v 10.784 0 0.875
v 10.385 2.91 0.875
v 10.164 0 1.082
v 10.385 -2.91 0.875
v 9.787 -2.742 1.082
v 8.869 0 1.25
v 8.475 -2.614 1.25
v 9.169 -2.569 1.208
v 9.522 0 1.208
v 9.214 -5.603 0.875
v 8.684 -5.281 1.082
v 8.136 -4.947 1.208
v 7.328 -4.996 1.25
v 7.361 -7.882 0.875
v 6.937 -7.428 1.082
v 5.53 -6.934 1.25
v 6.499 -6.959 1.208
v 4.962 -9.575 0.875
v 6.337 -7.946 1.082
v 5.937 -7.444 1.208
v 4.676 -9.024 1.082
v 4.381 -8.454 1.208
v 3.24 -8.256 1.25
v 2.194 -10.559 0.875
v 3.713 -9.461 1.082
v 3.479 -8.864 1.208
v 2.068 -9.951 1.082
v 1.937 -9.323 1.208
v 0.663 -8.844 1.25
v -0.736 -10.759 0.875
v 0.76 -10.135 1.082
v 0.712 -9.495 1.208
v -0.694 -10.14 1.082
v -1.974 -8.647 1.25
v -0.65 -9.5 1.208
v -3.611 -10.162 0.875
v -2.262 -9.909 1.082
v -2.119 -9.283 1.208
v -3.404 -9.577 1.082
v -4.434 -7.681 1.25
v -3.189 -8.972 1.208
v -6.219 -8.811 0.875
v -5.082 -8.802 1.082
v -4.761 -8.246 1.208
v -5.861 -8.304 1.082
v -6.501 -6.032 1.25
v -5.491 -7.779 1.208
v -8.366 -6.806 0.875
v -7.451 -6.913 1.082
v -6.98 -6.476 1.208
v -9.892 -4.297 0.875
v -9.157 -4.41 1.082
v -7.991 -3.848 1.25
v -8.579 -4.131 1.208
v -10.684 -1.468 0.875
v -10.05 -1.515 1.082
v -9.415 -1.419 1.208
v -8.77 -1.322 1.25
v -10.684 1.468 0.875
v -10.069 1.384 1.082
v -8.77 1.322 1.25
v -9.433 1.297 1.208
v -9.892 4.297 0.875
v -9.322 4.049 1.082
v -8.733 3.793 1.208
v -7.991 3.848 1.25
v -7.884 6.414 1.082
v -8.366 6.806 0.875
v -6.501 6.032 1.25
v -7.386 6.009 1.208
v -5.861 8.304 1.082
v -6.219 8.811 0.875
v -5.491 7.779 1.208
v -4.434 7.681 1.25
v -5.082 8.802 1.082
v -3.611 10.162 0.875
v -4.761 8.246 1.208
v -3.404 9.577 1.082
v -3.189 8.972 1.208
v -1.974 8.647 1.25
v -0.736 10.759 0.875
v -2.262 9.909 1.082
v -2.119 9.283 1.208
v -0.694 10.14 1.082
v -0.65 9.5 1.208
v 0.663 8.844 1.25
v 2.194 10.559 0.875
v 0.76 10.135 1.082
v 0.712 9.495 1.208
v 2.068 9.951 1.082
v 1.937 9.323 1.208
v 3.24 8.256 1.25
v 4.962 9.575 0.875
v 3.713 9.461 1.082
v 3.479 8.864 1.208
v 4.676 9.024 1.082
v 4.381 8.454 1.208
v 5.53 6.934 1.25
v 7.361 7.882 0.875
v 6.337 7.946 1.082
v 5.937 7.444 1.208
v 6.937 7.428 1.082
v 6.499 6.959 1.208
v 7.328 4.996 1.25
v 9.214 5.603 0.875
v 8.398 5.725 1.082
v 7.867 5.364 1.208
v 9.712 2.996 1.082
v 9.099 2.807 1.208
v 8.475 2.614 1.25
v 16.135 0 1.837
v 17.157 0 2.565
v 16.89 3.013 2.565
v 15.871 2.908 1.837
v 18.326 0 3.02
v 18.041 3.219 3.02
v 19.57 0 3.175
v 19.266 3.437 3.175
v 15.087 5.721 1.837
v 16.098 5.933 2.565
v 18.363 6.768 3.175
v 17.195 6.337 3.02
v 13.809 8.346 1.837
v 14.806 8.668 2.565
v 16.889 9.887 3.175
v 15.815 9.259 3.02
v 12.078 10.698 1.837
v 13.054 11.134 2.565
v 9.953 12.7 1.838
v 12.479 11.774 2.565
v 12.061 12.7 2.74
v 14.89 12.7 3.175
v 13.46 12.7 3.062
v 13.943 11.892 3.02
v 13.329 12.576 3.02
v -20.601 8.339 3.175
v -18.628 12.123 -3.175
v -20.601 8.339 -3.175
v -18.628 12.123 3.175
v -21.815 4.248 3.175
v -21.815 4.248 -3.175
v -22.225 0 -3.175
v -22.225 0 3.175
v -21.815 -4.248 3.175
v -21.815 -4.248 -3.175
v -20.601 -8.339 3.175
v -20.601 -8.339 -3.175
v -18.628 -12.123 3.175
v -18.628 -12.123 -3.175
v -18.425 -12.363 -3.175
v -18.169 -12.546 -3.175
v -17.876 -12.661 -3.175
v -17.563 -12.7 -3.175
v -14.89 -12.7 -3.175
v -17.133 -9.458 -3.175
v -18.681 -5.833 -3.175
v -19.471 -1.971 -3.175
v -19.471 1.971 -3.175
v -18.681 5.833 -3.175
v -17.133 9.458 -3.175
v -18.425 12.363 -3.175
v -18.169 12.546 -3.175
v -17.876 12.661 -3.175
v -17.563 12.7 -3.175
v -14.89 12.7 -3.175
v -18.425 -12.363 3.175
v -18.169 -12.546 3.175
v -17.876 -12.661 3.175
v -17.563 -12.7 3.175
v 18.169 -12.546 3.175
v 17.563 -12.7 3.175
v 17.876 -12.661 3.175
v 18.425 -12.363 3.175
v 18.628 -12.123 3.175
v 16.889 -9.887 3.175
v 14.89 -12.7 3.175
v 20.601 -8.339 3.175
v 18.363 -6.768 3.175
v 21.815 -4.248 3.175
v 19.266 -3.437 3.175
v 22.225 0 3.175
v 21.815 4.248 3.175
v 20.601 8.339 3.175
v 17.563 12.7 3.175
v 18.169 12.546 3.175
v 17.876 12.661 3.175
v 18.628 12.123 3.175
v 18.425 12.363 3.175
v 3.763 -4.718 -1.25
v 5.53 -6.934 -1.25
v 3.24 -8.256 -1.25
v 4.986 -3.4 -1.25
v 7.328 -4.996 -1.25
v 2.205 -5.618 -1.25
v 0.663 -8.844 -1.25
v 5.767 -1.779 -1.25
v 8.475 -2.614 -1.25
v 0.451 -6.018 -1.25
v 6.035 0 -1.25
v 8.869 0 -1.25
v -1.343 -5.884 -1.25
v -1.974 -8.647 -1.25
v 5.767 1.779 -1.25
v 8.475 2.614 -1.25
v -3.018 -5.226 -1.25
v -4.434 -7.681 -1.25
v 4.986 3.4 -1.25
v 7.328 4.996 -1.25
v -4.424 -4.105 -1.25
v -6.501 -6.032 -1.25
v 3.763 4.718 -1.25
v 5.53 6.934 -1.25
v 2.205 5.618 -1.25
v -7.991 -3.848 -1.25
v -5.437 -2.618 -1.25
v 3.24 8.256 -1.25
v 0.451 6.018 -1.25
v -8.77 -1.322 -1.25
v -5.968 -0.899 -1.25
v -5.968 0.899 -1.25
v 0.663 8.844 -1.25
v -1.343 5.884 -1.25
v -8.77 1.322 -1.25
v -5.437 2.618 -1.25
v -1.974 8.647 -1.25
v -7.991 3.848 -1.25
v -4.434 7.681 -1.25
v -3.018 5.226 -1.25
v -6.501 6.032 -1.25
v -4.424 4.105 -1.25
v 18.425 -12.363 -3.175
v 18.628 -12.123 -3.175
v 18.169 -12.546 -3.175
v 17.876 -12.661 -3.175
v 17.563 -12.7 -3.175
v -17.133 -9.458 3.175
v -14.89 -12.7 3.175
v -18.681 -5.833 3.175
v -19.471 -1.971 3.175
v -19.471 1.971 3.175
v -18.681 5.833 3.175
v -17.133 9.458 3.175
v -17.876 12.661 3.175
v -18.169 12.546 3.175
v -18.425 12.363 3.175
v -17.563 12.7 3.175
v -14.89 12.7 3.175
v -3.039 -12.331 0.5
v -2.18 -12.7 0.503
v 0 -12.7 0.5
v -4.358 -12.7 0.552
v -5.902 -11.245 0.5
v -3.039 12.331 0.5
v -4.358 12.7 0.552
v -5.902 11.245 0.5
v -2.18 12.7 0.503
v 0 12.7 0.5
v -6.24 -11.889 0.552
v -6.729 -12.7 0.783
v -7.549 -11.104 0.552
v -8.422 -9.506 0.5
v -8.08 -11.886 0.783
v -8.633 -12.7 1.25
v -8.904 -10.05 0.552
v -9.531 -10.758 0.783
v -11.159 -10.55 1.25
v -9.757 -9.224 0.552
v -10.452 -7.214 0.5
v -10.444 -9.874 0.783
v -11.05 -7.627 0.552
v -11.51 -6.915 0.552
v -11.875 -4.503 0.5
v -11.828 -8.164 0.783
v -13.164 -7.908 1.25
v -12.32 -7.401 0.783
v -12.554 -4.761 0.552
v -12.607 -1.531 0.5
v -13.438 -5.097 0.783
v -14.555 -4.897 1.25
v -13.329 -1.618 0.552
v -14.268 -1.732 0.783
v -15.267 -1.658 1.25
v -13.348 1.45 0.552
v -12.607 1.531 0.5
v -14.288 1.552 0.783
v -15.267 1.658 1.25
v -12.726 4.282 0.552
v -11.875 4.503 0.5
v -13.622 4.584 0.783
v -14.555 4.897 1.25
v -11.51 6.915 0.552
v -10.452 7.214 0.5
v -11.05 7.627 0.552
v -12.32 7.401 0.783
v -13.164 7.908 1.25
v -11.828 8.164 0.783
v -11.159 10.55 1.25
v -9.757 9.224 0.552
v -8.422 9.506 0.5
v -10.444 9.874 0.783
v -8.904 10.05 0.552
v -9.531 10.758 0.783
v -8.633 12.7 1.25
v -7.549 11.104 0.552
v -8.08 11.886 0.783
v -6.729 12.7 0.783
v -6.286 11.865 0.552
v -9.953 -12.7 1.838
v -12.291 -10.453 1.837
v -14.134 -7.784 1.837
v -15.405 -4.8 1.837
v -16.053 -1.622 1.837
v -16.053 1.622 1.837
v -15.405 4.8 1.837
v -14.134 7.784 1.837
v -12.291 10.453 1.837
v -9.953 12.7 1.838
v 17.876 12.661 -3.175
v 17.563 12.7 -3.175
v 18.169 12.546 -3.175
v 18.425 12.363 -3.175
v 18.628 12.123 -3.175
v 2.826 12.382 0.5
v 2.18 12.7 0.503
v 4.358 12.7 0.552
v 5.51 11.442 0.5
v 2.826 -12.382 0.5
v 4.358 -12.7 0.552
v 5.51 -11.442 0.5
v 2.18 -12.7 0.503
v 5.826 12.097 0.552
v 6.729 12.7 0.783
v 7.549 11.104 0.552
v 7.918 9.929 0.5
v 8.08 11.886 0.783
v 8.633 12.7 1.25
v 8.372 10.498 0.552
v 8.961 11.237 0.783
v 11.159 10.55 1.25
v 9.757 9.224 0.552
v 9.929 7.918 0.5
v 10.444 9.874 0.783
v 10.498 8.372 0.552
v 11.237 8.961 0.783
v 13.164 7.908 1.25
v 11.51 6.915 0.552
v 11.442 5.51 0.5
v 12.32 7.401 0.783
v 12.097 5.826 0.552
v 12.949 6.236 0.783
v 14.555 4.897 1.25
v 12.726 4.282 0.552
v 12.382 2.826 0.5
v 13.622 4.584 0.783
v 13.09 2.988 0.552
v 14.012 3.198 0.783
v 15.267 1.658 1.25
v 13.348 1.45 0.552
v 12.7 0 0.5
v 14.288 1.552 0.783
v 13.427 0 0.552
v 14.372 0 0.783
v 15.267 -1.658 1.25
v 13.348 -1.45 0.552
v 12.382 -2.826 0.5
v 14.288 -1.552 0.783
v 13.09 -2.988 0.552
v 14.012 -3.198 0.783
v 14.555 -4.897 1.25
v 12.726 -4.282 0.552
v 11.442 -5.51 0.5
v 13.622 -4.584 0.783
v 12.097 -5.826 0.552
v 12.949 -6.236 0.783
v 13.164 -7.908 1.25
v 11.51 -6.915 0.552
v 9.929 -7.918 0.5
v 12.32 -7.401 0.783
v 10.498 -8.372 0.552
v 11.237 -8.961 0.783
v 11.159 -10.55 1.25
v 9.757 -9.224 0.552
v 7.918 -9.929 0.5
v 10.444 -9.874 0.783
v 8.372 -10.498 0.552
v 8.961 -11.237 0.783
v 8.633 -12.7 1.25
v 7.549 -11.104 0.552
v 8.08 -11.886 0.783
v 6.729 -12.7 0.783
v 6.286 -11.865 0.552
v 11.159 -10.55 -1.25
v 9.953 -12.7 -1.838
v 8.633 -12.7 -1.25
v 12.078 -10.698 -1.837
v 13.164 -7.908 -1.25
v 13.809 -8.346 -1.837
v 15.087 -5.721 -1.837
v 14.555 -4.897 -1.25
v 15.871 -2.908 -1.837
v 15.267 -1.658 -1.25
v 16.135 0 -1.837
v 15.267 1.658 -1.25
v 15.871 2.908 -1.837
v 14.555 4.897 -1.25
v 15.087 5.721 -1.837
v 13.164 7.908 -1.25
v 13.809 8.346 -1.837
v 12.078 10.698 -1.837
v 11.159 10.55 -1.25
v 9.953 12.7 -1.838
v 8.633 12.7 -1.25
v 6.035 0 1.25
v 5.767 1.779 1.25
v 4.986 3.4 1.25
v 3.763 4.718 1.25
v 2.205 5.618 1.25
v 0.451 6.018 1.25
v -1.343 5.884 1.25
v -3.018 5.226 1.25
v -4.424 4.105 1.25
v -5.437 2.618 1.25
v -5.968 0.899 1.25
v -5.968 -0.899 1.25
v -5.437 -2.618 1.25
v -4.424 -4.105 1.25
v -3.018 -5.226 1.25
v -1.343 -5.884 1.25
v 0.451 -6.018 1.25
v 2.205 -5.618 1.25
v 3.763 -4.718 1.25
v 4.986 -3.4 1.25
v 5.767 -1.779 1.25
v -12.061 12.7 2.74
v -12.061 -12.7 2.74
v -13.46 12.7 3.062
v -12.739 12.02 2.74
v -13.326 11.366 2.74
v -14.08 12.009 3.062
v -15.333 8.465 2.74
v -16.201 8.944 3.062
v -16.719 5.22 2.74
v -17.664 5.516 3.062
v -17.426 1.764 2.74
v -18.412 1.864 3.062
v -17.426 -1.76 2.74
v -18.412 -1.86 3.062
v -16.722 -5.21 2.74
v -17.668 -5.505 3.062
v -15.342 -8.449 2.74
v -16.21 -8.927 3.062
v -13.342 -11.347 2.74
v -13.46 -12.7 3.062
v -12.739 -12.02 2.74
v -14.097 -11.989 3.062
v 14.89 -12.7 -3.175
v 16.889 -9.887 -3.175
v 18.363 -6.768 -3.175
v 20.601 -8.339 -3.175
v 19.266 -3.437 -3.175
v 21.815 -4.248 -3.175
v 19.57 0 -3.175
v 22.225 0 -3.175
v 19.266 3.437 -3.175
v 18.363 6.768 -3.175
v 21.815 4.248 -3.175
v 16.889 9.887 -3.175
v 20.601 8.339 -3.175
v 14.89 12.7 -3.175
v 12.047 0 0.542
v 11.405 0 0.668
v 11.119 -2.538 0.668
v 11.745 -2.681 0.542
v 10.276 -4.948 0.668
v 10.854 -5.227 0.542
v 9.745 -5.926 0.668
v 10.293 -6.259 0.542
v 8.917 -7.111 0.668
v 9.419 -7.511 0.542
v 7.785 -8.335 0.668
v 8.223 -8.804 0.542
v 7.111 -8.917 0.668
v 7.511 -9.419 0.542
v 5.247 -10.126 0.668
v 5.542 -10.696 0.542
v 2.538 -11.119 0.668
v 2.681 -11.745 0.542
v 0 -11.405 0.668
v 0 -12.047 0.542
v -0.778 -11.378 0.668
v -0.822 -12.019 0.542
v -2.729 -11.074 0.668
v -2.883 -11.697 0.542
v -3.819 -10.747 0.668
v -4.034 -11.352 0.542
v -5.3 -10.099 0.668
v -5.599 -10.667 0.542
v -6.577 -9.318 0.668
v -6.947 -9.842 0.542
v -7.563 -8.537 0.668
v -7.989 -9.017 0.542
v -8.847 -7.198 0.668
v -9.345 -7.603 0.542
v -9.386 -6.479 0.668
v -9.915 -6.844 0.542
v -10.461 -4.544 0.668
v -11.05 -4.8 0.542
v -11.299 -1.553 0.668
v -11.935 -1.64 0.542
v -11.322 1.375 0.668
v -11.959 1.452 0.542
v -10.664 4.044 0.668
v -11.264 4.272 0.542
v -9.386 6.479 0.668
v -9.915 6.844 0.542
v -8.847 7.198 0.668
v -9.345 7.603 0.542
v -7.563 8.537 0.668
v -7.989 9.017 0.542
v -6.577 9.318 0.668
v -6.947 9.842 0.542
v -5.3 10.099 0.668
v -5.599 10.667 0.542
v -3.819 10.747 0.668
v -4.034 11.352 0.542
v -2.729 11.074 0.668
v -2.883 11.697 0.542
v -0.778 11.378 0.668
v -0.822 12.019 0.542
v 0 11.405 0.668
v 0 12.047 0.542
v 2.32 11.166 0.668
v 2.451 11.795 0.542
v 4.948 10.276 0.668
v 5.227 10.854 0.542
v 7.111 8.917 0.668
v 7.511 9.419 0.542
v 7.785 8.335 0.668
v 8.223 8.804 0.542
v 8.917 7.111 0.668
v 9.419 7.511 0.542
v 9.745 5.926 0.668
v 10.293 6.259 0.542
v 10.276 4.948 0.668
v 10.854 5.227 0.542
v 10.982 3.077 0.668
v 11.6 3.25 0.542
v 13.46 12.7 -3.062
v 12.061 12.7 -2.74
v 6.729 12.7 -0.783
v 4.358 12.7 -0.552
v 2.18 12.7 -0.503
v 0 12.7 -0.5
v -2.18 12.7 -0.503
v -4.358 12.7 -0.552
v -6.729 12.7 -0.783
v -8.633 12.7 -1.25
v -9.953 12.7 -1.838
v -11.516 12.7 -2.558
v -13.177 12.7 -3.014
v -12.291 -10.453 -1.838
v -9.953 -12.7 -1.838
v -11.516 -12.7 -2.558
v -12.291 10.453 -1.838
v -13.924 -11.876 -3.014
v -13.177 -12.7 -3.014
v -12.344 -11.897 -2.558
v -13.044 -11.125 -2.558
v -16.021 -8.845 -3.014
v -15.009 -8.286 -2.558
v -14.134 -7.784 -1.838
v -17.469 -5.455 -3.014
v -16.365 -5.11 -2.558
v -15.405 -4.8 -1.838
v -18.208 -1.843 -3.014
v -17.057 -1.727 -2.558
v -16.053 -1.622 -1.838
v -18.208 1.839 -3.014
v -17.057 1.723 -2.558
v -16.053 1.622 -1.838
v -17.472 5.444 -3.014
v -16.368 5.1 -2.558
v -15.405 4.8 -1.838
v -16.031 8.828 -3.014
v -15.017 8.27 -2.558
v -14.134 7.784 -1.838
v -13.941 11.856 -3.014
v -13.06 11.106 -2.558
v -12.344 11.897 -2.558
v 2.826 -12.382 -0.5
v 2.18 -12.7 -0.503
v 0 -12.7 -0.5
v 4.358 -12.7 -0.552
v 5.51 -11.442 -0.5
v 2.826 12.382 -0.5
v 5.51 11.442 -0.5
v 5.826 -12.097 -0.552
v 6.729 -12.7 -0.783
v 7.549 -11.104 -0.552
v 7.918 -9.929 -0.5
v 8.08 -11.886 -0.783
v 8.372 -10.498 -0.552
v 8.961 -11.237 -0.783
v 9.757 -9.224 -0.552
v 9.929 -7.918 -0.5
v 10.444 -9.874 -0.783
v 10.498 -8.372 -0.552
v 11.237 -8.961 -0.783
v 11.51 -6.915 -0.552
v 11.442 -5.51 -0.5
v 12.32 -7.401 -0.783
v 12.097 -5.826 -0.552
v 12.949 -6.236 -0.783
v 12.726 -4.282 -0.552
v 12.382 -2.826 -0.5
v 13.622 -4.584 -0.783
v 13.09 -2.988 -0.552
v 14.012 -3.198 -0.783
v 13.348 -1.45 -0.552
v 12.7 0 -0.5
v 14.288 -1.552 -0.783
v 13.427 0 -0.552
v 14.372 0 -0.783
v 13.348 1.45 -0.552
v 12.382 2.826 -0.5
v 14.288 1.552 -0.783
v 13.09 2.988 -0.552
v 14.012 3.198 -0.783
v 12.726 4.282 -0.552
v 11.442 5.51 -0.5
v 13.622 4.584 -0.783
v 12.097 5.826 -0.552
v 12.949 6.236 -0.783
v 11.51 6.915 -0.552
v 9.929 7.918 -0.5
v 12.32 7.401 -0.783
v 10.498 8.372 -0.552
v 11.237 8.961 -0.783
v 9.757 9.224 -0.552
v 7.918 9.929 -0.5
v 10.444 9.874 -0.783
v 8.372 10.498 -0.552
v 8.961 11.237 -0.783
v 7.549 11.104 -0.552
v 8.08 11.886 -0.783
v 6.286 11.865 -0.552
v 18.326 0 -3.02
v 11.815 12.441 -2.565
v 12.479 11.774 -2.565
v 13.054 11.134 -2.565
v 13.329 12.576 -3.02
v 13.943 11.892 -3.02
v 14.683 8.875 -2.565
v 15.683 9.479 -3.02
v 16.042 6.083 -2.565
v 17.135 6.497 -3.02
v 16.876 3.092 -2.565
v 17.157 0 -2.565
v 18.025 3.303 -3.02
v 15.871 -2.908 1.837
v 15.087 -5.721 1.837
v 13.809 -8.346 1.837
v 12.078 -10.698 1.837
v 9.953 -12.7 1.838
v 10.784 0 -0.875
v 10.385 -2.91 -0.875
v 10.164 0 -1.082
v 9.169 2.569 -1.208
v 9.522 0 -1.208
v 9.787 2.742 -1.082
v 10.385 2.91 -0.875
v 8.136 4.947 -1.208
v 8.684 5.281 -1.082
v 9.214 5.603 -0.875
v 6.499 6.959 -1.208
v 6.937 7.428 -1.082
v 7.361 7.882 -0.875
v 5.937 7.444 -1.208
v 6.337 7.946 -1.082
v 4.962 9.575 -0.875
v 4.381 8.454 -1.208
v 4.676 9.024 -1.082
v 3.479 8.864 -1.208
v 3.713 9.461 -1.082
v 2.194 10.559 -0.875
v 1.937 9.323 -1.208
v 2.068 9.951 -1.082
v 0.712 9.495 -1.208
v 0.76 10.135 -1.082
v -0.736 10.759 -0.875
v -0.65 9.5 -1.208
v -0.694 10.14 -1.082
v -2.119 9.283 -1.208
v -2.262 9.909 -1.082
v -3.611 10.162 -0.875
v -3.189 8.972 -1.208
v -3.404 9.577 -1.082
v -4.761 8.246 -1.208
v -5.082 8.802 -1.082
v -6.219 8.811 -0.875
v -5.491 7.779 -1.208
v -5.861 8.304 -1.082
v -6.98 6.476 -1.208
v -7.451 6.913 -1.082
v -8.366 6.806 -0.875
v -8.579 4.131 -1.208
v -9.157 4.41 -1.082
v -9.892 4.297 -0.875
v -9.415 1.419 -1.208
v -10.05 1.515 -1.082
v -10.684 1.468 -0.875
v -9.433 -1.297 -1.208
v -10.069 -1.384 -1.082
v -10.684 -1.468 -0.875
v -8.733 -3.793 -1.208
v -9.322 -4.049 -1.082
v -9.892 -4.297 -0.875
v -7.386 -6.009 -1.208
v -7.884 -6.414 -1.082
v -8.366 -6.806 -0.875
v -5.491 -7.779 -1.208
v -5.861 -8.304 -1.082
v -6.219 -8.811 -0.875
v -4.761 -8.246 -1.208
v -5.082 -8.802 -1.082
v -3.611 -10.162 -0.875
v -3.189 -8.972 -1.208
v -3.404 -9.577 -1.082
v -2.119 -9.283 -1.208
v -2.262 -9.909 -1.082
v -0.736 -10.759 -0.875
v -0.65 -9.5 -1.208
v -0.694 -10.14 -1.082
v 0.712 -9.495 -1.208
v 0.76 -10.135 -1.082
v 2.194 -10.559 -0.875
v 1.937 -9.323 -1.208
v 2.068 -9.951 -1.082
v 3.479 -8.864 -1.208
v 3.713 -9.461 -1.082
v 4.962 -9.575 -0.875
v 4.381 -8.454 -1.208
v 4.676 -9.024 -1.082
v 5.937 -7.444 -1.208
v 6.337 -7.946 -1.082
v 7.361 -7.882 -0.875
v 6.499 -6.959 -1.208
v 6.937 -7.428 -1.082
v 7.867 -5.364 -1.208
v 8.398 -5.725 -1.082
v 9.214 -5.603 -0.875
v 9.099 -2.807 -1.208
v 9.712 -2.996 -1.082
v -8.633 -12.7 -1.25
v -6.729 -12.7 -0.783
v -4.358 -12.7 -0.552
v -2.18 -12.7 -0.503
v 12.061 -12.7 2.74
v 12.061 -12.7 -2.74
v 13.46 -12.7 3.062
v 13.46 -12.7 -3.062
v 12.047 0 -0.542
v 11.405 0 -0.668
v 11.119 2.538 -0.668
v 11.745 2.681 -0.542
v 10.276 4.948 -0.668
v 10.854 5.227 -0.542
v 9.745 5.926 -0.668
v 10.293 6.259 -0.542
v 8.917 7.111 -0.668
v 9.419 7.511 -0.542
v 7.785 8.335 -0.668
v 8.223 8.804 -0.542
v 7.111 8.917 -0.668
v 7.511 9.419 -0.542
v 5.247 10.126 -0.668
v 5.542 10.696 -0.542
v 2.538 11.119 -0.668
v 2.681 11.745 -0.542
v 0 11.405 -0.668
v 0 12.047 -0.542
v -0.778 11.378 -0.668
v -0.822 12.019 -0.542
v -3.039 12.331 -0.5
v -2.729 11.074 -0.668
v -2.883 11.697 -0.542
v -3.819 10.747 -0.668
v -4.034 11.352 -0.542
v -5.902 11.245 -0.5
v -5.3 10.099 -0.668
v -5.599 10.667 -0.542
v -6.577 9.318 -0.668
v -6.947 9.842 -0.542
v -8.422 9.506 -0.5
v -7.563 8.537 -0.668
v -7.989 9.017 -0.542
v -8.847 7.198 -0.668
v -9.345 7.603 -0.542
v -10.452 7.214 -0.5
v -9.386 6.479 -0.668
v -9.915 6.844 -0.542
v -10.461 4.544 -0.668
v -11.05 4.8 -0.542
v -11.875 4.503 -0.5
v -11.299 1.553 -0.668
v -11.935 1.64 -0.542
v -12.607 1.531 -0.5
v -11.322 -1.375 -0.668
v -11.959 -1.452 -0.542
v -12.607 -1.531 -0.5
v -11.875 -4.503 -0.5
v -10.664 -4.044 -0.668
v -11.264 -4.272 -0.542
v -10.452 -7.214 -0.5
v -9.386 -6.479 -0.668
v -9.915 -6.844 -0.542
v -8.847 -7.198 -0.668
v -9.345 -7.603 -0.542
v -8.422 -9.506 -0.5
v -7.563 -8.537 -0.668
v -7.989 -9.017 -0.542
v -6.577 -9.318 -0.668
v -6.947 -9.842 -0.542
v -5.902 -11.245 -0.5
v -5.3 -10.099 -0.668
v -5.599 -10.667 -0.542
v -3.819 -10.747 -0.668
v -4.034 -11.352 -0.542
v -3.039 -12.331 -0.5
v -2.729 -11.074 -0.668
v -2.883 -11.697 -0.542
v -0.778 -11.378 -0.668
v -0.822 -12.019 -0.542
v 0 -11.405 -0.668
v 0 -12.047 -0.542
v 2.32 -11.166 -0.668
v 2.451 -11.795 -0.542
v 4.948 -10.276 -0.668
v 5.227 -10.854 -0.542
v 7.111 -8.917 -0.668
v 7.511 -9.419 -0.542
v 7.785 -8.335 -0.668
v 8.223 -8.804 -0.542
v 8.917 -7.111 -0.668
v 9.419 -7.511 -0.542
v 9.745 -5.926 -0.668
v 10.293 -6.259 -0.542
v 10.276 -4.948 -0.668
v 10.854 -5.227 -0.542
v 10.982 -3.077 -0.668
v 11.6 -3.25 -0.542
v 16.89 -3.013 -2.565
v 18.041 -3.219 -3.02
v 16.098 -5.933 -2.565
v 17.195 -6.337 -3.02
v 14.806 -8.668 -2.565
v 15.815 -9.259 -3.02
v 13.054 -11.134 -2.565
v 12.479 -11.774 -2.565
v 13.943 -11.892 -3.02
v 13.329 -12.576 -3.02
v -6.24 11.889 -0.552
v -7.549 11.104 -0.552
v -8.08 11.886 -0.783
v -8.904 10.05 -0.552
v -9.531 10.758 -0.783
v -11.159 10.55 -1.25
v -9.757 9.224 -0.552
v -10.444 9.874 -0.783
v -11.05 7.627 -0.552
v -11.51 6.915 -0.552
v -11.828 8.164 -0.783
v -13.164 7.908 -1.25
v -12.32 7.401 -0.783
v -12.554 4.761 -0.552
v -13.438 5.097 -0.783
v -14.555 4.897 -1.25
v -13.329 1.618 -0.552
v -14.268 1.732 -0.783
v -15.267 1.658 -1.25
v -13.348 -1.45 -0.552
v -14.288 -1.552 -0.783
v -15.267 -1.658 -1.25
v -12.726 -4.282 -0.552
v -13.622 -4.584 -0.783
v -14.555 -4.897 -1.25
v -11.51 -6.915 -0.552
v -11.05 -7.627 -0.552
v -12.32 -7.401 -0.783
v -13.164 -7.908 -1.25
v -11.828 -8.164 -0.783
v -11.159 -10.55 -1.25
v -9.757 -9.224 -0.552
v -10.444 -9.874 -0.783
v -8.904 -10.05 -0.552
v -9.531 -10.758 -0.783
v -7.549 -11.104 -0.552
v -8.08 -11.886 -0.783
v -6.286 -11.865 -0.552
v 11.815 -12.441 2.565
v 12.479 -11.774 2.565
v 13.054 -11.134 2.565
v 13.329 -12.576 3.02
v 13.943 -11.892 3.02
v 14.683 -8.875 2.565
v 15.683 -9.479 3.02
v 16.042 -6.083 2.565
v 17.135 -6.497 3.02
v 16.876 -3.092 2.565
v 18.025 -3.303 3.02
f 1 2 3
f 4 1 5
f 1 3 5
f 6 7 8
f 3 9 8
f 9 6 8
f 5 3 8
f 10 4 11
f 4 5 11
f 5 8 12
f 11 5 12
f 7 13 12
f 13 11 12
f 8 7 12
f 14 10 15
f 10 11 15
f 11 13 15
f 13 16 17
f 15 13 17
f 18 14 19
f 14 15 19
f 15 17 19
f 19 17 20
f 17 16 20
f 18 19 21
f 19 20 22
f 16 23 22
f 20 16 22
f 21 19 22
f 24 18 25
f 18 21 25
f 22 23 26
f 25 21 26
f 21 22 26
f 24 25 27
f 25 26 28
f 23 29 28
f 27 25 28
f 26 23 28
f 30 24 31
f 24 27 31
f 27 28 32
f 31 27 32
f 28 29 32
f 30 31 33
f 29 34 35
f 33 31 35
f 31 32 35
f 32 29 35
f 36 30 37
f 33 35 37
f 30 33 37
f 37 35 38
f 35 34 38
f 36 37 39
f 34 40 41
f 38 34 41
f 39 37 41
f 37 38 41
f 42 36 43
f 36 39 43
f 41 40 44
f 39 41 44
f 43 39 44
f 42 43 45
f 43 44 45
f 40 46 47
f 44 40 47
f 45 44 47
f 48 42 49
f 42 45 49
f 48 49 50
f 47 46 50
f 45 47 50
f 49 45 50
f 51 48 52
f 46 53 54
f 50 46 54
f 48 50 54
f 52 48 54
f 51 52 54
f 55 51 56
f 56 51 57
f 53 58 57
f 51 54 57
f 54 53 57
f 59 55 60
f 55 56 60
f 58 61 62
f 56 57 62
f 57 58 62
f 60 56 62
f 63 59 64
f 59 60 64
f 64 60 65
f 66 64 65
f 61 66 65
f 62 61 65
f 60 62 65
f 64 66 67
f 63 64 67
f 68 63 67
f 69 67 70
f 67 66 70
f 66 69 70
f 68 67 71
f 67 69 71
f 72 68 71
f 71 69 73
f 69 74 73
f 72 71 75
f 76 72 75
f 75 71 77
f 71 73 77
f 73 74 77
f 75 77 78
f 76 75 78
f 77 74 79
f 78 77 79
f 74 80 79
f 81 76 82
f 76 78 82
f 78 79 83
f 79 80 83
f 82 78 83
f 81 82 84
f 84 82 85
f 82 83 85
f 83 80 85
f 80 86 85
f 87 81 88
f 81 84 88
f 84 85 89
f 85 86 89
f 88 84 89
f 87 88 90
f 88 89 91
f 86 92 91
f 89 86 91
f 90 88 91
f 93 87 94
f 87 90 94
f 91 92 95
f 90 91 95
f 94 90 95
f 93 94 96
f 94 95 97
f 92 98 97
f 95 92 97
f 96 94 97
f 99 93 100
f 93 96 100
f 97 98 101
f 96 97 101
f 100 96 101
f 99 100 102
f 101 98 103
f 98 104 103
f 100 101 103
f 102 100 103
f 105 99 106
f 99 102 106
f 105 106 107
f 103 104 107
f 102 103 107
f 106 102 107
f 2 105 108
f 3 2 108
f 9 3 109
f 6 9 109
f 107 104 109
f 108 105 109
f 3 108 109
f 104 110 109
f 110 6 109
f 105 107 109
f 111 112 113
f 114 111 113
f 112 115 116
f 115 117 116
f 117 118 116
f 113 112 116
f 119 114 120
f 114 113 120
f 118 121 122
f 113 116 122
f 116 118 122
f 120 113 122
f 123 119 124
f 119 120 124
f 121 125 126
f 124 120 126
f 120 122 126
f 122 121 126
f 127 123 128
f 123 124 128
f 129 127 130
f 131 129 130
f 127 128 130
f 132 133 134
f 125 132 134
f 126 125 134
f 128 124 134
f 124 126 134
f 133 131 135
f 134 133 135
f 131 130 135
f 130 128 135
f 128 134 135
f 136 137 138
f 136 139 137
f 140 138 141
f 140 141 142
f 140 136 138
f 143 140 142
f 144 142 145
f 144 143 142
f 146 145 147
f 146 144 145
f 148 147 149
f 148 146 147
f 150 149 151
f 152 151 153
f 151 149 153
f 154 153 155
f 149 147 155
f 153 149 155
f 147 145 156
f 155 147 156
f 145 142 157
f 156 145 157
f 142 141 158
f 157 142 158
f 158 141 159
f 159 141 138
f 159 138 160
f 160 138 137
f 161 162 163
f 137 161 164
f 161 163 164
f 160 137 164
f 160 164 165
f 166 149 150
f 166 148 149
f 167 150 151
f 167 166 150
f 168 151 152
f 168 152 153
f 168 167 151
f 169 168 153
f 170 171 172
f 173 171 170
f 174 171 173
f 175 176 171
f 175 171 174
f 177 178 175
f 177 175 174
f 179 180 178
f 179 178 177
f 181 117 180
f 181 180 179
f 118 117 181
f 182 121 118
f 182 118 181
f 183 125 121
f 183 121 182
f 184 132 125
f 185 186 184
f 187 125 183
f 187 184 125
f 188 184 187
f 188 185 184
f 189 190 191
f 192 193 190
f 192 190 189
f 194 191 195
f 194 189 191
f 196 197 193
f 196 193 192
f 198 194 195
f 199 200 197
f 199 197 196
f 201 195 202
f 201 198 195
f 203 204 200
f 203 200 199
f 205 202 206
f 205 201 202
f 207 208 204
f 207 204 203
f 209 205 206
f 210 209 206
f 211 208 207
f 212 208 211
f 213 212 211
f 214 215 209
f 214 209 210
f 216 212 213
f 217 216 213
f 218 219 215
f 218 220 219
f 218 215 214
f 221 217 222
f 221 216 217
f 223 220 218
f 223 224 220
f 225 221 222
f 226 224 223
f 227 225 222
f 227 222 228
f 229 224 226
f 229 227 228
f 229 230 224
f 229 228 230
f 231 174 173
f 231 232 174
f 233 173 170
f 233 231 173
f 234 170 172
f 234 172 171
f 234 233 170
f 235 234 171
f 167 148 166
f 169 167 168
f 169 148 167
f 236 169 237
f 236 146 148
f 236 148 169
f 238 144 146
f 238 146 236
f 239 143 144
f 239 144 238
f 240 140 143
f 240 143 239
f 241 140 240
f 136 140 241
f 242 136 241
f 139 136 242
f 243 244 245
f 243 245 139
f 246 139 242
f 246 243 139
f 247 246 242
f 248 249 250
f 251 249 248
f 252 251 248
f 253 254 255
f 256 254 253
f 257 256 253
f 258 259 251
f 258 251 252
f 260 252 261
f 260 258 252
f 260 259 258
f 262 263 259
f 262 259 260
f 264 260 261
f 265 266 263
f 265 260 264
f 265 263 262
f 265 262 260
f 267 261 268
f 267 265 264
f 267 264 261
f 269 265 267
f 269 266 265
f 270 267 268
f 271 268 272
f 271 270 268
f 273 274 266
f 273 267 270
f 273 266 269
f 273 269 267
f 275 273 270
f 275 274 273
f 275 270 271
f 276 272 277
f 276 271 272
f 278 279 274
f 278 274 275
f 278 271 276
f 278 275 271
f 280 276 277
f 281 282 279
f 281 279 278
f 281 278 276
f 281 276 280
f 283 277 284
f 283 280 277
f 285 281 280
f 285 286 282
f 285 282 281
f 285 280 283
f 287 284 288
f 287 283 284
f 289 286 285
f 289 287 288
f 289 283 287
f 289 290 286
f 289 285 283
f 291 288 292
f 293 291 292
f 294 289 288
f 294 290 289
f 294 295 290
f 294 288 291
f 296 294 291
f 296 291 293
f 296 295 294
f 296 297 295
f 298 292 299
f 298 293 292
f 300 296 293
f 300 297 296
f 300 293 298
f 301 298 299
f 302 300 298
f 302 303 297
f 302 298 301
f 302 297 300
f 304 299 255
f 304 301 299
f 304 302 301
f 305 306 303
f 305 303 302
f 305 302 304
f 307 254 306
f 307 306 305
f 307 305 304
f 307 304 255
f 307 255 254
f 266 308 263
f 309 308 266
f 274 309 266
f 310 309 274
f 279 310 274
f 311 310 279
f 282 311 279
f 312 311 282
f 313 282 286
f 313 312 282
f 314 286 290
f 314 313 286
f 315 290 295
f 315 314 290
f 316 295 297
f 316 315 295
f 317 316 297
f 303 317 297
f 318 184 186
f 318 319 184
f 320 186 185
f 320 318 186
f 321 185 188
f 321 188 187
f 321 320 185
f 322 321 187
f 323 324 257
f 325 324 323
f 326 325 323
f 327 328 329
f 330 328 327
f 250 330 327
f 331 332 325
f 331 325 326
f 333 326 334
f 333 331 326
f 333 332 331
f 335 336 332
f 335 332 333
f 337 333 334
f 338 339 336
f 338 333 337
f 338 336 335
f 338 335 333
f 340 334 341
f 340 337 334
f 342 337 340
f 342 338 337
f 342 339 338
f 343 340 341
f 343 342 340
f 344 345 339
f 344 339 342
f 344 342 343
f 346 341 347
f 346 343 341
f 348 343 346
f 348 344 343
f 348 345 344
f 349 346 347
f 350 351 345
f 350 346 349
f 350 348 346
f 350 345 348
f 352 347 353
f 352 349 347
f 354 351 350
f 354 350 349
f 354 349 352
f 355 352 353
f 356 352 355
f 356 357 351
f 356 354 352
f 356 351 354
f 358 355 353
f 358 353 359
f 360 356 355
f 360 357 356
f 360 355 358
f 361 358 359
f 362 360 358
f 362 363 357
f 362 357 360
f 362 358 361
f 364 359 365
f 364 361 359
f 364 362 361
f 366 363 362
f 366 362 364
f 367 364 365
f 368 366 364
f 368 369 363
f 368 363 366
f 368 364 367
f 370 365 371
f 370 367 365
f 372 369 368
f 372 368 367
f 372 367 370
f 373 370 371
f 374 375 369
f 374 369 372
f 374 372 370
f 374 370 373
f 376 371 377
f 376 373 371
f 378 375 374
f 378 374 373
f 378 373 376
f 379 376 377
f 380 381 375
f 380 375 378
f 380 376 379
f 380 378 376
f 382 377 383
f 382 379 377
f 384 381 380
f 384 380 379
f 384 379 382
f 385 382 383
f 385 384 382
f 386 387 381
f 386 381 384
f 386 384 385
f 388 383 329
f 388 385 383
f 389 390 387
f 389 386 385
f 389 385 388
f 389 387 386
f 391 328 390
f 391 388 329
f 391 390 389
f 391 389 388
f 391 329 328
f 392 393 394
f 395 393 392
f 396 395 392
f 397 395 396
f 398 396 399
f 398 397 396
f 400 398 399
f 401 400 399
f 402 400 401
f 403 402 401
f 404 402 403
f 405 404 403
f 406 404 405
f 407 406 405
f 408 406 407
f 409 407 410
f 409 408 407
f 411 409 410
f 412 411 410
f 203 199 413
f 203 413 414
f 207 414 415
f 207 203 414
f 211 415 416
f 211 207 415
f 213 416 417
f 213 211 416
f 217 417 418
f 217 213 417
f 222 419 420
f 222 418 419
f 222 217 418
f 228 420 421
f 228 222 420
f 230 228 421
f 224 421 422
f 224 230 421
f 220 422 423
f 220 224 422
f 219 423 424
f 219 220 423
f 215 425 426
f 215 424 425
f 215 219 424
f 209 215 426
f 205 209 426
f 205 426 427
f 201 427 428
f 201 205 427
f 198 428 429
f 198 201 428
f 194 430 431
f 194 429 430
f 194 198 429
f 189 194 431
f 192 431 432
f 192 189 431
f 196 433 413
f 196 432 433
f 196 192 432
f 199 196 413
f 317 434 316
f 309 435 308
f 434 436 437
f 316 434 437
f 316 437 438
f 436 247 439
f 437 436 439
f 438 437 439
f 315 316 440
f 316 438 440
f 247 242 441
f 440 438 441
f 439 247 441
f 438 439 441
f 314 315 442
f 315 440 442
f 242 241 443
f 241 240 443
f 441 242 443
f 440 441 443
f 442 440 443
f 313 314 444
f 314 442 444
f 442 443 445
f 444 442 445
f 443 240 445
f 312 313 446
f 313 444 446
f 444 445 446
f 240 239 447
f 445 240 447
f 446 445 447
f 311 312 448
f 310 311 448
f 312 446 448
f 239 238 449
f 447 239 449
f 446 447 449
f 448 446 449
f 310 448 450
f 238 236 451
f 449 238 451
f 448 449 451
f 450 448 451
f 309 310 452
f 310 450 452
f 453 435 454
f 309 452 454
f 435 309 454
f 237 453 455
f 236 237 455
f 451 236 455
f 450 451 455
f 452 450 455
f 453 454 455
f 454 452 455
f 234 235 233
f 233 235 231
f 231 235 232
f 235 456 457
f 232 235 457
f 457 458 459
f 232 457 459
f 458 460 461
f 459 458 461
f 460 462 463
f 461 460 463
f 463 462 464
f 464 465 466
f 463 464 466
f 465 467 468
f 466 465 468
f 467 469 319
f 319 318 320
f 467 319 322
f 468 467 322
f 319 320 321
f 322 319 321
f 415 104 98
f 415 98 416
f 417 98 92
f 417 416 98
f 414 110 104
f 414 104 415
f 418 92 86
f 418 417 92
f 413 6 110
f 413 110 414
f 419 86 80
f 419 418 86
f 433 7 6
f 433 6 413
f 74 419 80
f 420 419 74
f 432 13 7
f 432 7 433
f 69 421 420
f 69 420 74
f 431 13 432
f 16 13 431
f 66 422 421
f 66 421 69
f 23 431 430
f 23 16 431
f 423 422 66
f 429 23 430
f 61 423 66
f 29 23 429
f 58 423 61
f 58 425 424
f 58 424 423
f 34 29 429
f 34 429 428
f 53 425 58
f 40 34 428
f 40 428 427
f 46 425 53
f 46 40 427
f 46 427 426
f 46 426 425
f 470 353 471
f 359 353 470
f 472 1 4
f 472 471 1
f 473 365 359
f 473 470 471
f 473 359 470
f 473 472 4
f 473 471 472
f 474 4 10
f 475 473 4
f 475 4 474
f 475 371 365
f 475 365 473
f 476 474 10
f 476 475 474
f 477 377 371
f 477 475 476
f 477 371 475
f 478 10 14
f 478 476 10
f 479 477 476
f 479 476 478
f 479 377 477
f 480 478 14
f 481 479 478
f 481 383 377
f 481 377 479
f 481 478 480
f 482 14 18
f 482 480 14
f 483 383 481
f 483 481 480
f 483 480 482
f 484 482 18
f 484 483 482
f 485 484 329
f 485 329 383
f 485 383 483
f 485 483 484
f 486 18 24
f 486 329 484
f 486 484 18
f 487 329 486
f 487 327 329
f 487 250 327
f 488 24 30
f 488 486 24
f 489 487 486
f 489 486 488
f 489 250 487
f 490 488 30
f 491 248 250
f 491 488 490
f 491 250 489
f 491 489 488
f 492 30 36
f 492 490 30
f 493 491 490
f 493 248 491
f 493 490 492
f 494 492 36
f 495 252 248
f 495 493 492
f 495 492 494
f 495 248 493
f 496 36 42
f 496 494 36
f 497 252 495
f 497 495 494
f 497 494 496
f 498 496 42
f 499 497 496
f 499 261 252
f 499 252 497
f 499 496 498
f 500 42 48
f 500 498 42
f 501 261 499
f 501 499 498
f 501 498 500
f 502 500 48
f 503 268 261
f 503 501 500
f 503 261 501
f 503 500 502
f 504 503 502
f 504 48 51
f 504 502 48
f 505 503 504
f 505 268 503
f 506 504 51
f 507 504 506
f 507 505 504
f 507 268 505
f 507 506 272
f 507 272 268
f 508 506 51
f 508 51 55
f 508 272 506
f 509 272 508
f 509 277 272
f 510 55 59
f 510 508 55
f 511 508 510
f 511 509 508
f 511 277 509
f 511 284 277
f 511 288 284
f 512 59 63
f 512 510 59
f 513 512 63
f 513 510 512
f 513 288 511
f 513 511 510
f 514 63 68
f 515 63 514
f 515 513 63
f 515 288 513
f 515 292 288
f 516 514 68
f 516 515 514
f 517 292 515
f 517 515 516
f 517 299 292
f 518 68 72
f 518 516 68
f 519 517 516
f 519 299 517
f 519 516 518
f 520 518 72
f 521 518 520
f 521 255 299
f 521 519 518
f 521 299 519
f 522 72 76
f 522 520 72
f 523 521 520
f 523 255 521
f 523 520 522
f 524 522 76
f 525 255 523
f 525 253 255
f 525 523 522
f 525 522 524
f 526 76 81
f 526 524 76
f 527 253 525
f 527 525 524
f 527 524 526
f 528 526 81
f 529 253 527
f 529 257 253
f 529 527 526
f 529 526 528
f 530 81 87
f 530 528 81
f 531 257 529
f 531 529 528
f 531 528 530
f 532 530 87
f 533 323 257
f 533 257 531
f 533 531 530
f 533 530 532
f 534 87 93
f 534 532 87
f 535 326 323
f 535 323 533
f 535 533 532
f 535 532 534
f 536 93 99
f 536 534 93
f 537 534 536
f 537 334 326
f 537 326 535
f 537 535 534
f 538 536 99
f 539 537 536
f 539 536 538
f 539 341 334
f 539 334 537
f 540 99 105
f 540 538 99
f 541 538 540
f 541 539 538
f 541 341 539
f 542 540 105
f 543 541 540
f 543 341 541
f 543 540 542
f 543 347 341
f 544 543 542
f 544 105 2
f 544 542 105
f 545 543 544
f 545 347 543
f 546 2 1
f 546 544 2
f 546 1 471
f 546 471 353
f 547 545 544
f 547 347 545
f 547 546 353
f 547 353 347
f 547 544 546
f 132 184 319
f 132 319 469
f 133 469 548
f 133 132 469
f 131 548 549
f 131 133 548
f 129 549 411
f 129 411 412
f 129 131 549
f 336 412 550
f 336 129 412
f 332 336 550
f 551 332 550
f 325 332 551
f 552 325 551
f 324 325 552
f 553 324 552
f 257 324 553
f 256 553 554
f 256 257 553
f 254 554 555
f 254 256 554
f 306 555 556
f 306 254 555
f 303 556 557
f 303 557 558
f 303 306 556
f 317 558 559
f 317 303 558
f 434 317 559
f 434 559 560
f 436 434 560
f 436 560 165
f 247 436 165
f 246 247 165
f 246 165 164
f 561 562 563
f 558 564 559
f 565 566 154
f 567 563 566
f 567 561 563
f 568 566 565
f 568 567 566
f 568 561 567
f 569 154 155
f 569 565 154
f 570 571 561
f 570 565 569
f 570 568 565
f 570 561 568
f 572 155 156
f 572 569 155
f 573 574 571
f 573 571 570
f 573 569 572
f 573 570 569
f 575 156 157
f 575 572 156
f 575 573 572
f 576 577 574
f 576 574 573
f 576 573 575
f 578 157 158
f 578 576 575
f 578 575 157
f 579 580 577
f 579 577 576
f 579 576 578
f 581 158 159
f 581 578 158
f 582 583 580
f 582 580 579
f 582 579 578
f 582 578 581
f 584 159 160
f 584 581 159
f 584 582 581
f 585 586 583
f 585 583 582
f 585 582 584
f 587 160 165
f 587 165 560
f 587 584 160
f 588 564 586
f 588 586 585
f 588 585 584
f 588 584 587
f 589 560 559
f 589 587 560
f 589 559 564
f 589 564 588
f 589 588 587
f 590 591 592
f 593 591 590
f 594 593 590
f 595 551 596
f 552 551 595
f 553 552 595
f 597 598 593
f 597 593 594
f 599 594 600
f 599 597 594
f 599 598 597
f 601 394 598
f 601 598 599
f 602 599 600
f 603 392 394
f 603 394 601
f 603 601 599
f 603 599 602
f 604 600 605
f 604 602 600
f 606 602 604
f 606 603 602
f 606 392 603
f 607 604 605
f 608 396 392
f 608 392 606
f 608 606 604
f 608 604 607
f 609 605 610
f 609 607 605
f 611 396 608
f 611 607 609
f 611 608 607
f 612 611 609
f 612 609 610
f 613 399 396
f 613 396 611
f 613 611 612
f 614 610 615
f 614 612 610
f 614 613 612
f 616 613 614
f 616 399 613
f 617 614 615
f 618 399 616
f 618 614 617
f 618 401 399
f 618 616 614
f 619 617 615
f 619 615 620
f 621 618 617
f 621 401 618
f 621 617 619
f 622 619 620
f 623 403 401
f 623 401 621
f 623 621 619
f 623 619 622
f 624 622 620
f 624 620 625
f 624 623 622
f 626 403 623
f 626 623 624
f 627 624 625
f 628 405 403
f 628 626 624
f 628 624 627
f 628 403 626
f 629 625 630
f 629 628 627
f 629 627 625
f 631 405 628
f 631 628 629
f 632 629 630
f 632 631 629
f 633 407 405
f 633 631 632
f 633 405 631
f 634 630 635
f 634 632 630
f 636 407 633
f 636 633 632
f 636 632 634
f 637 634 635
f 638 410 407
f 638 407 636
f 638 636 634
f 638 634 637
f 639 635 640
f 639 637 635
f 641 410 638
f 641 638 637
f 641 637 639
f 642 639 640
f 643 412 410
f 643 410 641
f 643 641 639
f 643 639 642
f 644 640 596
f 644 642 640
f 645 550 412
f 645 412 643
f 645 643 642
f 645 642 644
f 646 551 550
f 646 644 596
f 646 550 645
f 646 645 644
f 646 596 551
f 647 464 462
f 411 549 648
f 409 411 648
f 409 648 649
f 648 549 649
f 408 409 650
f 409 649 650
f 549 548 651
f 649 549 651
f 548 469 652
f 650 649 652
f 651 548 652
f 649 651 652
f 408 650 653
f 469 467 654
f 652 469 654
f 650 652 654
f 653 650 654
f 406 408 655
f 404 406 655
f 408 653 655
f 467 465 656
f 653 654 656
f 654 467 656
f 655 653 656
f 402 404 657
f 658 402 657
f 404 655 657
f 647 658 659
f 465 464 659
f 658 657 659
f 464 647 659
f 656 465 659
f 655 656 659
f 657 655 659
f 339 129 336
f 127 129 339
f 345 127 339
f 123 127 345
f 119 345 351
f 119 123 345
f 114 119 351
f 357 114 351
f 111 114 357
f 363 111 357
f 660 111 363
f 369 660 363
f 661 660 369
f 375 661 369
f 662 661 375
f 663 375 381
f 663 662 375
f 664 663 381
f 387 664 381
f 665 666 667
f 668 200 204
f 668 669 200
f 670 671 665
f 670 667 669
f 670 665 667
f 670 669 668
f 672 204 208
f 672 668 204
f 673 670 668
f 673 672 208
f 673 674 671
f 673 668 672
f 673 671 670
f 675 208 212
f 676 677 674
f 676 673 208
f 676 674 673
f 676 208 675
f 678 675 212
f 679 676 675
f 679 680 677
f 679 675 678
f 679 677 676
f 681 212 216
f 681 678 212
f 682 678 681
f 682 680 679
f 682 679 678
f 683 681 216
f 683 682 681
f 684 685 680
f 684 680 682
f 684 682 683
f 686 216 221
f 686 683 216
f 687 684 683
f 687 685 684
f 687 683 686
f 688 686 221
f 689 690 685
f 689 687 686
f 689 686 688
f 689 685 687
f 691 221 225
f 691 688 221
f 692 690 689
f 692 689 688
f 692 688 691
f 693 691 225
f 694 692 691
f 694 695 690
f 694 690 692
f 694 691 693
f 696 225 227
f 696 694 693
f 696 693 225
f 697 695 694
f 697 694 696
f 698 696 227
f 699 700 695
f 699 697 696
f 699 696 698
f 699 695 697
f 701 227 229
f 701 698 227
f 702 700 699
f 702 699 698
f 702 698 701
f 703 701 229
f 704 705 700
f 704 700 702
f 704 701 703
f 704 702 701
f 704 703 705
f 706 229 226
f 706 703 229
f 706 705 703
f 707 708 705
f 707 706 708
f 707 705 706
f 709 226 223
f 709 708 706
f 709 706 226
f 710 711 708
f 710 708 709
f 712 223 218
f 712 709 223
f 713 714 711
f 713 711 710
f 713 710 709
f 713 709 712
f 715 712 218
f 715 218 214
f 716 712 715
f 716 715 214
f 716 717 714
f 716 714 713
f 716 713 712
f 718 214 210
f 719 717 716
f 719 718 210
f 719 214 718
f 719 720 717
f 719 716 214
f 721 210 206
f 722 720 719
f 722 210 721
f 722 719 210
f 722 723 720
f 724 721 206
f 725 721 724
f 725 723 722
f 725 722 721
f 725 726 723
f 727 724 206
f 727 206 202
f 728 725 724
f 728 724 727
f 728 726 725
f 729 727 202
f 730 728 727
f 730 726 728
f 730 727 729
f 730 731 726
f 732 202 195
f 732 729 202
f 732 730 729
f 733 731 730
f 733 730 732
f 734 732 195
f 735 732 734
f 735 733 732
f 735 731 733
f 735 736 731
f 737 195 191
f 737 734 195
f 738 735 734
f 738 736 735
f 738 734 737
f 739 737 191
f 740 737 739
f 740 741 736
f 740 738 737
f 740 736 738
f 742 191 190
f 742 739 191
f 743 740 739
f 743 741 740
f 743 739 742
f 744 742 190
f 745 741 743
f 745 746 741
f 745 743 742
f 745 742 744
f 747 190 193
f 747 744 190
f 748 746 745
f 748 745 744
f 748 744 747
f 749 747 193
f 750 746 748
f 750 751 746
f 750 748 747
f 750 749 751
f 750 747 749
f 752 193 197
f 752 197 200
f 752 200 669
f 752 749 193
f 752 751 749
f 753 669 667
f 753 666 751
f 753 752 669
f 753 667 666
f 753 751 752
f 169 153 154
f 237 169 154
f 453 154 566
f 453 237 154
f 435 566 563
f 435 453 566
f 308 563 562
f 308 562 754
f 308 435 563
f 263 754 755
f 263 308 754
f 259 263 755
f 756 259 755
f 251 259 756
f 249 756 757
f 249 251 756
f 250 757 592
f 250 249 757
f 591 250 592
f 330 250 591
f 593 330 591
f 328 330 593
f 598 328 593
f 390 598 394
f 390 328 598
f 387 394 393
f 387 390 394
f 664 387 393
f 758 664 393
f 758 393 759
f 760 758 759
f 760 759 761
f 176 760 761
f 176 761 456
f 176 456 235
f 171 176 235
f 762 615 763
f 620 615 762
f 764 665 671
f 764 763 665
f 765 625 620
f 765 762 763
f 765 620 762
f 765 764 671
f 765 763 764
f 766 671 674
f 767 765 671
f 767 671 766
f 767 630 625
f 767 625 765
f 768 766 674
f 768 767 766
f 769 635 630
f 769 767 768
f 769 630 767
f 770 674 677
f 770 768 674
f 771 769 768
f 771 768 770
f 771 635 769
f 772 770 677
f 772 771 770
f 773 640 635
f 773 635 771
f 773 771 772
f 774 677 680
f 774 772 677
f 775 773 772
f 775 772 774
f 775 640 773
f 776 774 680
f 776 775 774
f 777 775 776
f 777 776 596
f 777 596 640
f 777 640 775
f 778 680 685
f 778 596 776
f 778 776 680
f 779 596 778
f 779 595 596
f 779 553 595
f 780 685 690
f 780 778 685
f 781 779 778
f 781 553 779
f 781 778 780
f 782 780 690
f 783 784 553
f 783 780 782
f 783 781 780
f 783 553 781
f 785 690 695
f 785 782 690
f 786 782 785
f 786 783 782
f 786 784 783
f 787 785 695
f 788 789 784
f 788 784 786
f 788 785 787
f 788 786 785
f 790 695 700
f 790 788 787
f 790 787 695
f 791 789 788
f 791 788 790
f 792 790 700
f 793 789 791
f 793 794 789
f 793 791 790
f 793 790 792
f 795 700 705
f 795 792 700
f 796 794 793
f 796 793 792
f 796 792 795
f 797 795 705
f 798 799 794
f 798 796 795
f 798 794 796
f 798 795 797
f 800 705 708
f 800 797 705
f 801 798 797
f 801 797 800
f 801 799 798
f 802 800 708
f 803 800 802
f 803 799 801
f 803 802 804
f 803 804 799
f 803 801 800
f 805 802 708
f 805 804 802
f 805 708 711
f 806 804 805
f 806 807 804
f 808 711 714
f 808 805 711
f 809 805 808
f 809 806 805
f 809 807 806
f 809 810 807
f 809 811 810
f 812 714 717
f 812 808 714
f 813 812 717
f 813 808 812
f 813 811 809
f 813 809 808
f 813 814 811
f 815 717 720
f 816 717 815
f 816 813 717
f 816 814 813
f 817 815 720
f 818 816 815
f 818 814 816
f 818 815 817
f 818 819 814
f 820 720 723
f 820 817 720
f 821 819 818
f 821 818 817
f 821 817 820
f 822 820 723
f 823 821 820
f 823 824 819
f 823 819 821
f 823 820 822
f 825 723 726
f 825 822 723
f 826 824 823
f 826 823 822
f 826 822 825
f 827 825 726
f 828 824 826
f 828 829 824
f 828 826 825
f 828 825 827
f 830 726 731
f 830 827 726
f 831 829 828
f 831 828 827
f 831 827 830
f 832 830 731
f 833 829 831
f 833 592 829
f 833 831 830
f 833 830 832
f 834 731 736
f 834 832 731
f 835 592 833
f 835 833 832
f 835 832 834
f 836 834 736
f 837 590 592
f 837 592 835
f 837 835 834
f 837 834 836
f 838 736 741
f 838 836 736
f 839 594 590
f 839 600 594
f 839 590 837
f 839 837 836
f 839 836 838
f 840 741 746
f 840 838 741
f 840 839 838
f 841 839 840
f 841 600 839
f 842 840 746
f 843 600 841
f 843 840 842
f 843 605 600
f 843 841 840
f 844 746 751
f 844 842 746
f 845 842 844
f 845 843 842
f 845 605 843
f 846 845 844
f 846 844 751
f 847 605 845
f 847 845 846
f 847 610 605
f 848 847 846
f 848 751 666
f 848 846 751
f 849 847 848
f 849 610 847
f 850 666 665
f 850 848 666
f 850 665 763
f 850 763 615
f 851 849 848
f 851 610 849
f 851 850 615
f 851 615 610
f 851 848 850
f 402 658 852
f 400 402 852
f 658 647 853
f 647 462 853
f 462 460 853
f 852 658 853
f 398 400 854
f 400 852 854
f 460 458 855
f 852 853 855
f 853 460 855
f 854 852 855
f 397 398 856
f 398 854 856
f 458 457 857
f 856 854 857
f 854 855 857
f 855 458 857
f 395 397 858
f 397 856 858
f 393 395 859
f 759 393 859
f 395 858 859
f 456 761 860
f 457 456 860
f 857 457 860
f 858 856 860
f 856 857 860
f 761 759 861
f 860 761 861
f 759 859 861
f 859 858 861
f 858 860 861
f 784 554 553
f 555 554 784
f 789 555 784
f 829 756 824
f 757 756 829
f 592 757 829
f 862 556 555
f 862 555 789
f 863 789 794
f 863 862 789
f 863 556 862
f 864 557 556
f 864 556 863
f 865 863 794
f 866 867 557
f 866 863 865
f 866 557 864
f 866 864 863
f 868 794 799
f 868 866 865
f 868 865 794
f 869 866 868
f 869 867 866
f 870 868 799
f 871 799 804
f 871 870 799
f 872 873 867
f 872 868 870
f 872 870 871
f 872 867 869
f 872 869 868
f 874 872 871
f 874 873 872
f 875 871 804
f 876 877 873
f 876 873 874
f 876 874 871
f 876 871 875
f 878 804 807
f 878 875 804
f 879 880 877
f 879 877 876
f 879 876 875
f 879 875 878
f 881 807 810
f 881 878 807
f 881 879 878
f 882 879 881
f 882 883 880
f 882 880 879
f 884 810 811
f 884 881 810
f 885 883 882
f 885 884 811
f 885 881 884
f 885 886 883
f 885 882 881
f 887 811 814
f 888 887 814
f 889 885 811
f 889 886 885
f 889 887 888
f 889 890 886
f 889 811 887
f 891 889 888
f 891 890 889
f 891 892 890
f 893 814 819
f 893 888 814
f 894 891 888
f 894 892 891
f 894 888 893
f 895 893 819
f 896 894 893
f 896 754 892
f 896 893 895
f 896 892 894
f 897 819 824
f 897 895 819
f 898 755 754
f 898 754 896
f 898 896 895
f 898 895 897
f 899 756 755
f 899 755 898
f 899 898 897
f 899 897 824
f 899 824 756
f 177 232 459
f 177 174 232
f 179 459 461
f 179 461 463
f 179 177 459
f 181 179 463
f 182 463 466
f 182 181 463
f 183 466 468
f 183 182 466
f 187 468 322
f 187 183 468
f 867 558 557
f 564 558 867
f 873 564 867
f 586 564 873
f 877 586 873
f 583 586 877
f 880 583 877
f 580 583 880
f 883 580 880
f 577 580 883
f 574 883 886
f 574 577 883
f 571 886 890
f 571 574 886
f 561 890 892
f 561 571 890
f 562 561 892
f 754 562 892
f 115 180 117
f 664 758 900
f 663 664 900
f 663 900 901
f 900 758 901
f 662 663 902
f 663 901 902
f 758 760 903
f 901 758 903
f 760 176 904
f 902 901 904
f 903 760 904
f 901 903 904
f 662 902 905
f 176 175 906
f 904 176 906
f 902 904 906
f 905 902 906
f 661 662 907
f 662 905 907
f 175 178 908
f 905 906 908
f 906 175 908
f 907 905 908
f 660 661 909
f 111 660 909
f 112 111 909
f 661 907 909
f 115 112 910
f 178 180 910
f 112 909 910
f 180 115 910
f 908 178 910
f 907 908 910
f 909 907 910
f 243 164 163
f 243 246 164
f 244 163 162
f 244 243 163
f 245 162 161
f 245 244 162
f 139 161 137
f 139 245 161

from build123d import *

# Parameters (mm, degrees)
F0_R            = 6.035
F1_DEPTH        = 3.175
F3_COPIES_COUNT = 2
F4_T3_ANGLE     = 67.6677552602
F4_T6_ANGLE     = 67.6677552602
F4_T9_ANGLE     = 135.3490310549
F4_T18_ANGLE    = 135.3490310549
F4_T21_ANGLE    = 67.6677552602
F4_T24_ANGLE    = 67.6677552602
F5_R            = 1.27


# Not quite as in the source:
# - a fillet or chamfer that OpenCascade refuses, or shapes differently, is made with other operations: its cross-section is extruded or revolved along the edge and cut away or added
# - a pattern or mirror of a feature is missing from the dataset's text; its kind, count and spacing are read off the source's solid


with BuildPart() as f1:
    # F0 (on Top) → F1 (new body, symmetric)
    with BuildSketch(Plane.XY):
        with BuildLine():
            Line((18.2389864028, 12.7), (-18.2389864028, 12.7))
            ThreePointArc((-18.2389864028, 12.7), (-22.225, 0), (-18.2389864028, -12.7))
            Line((-18.2389864028, -12.7), (18.2389864028, -12.7))
            ThreePointArc((18.2389864028, -12.7), (22.225, 0), (18.2389864028, 12.7))
        make_face()
        Circle(F0_R, mode=Mode.SUBTRACT)
    extrude(amount=F1_DEPTH, both=True)

    # F2 (on Front) → F3 (revolve, cut)
    with BuildSketch(Plane.XZ):
        with BuildLine():
            ThreePointArc((15.3565955658, 1.25), (17.1329395143, 3.0989826153), (17.78, 5.58))
            ThreePointArc((17.78, 5.58), (13.844578608, 10.5293777195), (8.1357717283, 7.8102960081))
            ThreePointArc((8.1357717283, 7.8102960081), (7.8220449826, 4.1615660577), (10.0434044342, 1.25))
            Line((10.0434044342, 1.25), (12.7, 1.25))
            Line((12.7, 1.25), (15.3565955658, 1.25))
        make_face()
        with BuildLine():
            ThreePointArc((10.0434044342, 1.25), (7.8220449826, 4.1615660577), (8.1357717283, 7.8102960081))
            Line((8.1357717283, 7.8102960081), (0, 7.8102960081))
            Line((0, 7.8102960081), (0, 1.25))
            Line((0, 1.25), (10.0434044342, 1.25))
        make_face()
        with BuildLine():
            ThreePointArc((12.7, 0.5), (14.0802173742, 0.6910941919), (15.3565955658, 1.25))
            Line((15.3565955658, 1.25), (12.7, 1.25))
            Line((12.7, 1.25), (12.7, 0.5))
        make_face()
        with BuildLine():
            Line((12.7, 1.25), (10.0434044342, 1.25))
            ThreePointArc((10.0434044342, 1.25), (11.3197826258, 0.6910941919), (12.7, 0.5))
            Line((12.7, 0.5), (12.7, 1.25))
        make_face()
    f3 = revolve(axis=Axis((0, 0, 0), (0, 0, -1)), mode=Mode.SUBTRACT)

    # F3_copies: F3 ×2 about axis
    f3_copies_axis = Axis((0, 0, 0), (1, 0, 0))
    for i in range(1, F3_COPIES_COUNT):
        add(f3.rotate(f3_copies_axis, i * 360 / F3_COPIES_COUNT), mode=Mode.SUBTRACT)

    # F4: fillet of radius 5.08 on 9 edges, made by hand


with BuildPart() as f4_tool1:
    # F4_s2 → F4_t3 (revolve)
    with BuildSketch(Plane(origin=(0, 0, 0), x_dir=(0, 0, 1), z_dir=(-0.9249960227, -0.379976786, 0))):
        with BuildLine():
            ThreePointArc((1.8375, -16.1351264533), (2.828830373, -17.7270898644), (3.175, -19.5702529066))
            Line((3.175, -19.5702529066), (3.175, -17.1746368568))
            ThreePointArc((3.175, -17.1746368568), (2.4626157548, -16.7110242417), (1.8375, -16.1351264533))
        make_face()
    revolve(axis=Axis((0, 0, 3.175), (0, 0, 1)), revolution_arc=F4_T3_ANGLE)


with BuildPart() as f4_tool4:
    # F4_s5 → F4_t6 (revolve)
    with BuildSketch(Plane.XZ):
        with BuildLine():
            ThreePointArc((16.1351264533, 1.8375), (17.7270898644, 2.828830373), (19.5702529066, 3.175))
            Line((19.5702529066, 3.175), (17.1746368568, 3.175))
            ThreePointArc((17.1746368568, 3.175), (16.7110242417, 2.4626157548), (16.1351264533, 1.8375))
        make_face()
    revolve(axis=Axis((0, 0, 3.175), (0, 0, 1)), revolution_arc=F4_T6_ANGLE)


with BuildPart() as f4_tool7:
    # F4_s8 → F4_t9 (revolve)
    with BuildSketch(Plane(origin=(0, 0, 0), x_dir=(0, 0, 1), z_dir=(0.9250408493, 0.3798676441, 0))):
        with BuildLine():
            ThreePointArc((1.8375, -16.1351264533), (2.828830373, -17.7270898644), (3.175, -19.5702529066))
            Line((3.175, -19.5702529066), (3.175, -17.1746368568))
            ThreePointArc((3.175, -17.1746368568), (2.4626157548, -16.7110242417), (1.8375, -16.1351264533))
        make_face()
    revolve(axis=Axis((0, 0, 3.175), (0, 0, 1)), revolution_arc=F4_T9_ANGLE)


with BuildPart() as f4_tool10:
    # F4_s11 → F4_t12 (revolve)
    with BuildSketch(Plane.XZ):
        with BuildLine():
            ThreePointArc((10.7844387246, 0.875), (9.8448385139, 1.1553685922), (8.8688774491, 1.25))
            Line((8.8688774491, 1.25), (10.0434044342, 1.25))
            ThreePointArc((10.0434044342, 1.25), (10.4062452626, 1.0473308962), (10.7844387246, 0.875))
        make_face()
    revolve(axis=Axis((0, 0, 1.25), (0, 0, -1)))


with BuildPart() as f4_tool13:
    # F4_s14 → F4_t15 (revolve)
    with BuildSketch(Plane.XZ):
        with BuildLine():
            ThreePointArc((8.8688774491, -1.25), (9.8448385139, -1.1553685922), (10.7844387245, -0.875))
            ThreePointArc((10.7844387245, -0.875), (10.4062452626, -1.0473308962), (10.0434044342, -1.25))
            Line((10.0434044342, -1.25), (8.8688774491, -1.25))
        make_face()
    revolve(axis=Axis((0, 0, -1.25), (0, 0, 1)))


with BuildPart() as f4_tool16:
    # F4_s17 → F4_t18 (revolve)
    with BuildSketch(Plane(origin=(0, 0, 0), x_dir=(0, 0, 1), z_dir=(0.9250408493, -0.3798676441, 0))):
        with BuildLine():
            ThreePointArc((-3.175, 19.5702529066), (-2.828830373, 17.7270898644), (-1.8375, 16.1351264533))
            ThreePointArc((-1.8375, 16.1351264533), (-2.4626157548, 16.7110242417), (-3.175, 17.1746368568))
            Line((-3.175, 17.1746368568), (-3.175, 19.5702529066))
        make_face()
    revolve(axis=Axis((0, 0, -3.175), (0, 0, -1)), revolution_arc=F4_T18_ANGLE)


with BuildPart() as f4_tool19:
    # F4_s20 → F4_t21 (revolve)
    with BuildSketch(Plane.XZ):
        with BuildLine():
            ThreePointArc((16.1351264533, -1.8375), (17.7270898644, -2.828830373), (19.5702529066, -3.175))
            Line((19.5702529066, -3.175), (17.1746368568, -3.175))
            ThreePointArc((17.1746368568, -3.175), (16.7110242417, -2.4626157548), (16.1351264533, -1.8375))
        make_face()
    revolve(axis=Axis((0, 0, -3.175), (0, 0, -1)), revolution_arc=F4_T21_ANGLE)


with BuildPart() as f4_tool22:
    # F4_s23 → F4_t24 (revolve)
    with BuildSketch(Plane(origin=(0, 0, 0), x_dir=(0, 0, 1), z_dir=(-0.9249960227, 0.379976786, 0))):
        with BuildLine():
            ThreePointArc((-1.8375, 16.1351264533), (-2.828830373, 17.7270898644), (-3.175, 19.5702529066))
            Line((-3.175, 19.5702529066), (-3.175, 17.1746368568))
            ThreePointArc((-3.175, 17.1746368568), (-2.4626157548, 16.7110242417), (-1.8375, 16.1351264533))
        make_face()
    revolve(axis=Axis((0, 0, -3.175), (0, 0, -1)), revolution_arc=F4_T24_ANGLE)


with BuildPart() as f1_1:
    add(f1.part)

    # F4_t25: cut F4_tool1, F4_tool4, F4_tool7, F4_tool10, F4_tool13, F4_tool16, F4_tool19, F4_tool22
    add([f4_tool1.part, f4_tool4.part, f4_tool7.part, f4_tool10.part, f4_tool13.part, f4_tool16.part, f4_tool19.part, f4_tool22.part], mode=Mode.SUBTRACT)

    # F5
    f5_edges = [f1_1.edges().sort_by_distance(p)[0] for p in [
        (-18.238986, -12.7, 0),
        (-18.238986, 12.7, 0),
        (18.238986, 12.7, 0),
        (18.238986, -12.7, 0),
    ]]
    fillet(f5_edges, radius=F5_R)


solid = f1_1.part
